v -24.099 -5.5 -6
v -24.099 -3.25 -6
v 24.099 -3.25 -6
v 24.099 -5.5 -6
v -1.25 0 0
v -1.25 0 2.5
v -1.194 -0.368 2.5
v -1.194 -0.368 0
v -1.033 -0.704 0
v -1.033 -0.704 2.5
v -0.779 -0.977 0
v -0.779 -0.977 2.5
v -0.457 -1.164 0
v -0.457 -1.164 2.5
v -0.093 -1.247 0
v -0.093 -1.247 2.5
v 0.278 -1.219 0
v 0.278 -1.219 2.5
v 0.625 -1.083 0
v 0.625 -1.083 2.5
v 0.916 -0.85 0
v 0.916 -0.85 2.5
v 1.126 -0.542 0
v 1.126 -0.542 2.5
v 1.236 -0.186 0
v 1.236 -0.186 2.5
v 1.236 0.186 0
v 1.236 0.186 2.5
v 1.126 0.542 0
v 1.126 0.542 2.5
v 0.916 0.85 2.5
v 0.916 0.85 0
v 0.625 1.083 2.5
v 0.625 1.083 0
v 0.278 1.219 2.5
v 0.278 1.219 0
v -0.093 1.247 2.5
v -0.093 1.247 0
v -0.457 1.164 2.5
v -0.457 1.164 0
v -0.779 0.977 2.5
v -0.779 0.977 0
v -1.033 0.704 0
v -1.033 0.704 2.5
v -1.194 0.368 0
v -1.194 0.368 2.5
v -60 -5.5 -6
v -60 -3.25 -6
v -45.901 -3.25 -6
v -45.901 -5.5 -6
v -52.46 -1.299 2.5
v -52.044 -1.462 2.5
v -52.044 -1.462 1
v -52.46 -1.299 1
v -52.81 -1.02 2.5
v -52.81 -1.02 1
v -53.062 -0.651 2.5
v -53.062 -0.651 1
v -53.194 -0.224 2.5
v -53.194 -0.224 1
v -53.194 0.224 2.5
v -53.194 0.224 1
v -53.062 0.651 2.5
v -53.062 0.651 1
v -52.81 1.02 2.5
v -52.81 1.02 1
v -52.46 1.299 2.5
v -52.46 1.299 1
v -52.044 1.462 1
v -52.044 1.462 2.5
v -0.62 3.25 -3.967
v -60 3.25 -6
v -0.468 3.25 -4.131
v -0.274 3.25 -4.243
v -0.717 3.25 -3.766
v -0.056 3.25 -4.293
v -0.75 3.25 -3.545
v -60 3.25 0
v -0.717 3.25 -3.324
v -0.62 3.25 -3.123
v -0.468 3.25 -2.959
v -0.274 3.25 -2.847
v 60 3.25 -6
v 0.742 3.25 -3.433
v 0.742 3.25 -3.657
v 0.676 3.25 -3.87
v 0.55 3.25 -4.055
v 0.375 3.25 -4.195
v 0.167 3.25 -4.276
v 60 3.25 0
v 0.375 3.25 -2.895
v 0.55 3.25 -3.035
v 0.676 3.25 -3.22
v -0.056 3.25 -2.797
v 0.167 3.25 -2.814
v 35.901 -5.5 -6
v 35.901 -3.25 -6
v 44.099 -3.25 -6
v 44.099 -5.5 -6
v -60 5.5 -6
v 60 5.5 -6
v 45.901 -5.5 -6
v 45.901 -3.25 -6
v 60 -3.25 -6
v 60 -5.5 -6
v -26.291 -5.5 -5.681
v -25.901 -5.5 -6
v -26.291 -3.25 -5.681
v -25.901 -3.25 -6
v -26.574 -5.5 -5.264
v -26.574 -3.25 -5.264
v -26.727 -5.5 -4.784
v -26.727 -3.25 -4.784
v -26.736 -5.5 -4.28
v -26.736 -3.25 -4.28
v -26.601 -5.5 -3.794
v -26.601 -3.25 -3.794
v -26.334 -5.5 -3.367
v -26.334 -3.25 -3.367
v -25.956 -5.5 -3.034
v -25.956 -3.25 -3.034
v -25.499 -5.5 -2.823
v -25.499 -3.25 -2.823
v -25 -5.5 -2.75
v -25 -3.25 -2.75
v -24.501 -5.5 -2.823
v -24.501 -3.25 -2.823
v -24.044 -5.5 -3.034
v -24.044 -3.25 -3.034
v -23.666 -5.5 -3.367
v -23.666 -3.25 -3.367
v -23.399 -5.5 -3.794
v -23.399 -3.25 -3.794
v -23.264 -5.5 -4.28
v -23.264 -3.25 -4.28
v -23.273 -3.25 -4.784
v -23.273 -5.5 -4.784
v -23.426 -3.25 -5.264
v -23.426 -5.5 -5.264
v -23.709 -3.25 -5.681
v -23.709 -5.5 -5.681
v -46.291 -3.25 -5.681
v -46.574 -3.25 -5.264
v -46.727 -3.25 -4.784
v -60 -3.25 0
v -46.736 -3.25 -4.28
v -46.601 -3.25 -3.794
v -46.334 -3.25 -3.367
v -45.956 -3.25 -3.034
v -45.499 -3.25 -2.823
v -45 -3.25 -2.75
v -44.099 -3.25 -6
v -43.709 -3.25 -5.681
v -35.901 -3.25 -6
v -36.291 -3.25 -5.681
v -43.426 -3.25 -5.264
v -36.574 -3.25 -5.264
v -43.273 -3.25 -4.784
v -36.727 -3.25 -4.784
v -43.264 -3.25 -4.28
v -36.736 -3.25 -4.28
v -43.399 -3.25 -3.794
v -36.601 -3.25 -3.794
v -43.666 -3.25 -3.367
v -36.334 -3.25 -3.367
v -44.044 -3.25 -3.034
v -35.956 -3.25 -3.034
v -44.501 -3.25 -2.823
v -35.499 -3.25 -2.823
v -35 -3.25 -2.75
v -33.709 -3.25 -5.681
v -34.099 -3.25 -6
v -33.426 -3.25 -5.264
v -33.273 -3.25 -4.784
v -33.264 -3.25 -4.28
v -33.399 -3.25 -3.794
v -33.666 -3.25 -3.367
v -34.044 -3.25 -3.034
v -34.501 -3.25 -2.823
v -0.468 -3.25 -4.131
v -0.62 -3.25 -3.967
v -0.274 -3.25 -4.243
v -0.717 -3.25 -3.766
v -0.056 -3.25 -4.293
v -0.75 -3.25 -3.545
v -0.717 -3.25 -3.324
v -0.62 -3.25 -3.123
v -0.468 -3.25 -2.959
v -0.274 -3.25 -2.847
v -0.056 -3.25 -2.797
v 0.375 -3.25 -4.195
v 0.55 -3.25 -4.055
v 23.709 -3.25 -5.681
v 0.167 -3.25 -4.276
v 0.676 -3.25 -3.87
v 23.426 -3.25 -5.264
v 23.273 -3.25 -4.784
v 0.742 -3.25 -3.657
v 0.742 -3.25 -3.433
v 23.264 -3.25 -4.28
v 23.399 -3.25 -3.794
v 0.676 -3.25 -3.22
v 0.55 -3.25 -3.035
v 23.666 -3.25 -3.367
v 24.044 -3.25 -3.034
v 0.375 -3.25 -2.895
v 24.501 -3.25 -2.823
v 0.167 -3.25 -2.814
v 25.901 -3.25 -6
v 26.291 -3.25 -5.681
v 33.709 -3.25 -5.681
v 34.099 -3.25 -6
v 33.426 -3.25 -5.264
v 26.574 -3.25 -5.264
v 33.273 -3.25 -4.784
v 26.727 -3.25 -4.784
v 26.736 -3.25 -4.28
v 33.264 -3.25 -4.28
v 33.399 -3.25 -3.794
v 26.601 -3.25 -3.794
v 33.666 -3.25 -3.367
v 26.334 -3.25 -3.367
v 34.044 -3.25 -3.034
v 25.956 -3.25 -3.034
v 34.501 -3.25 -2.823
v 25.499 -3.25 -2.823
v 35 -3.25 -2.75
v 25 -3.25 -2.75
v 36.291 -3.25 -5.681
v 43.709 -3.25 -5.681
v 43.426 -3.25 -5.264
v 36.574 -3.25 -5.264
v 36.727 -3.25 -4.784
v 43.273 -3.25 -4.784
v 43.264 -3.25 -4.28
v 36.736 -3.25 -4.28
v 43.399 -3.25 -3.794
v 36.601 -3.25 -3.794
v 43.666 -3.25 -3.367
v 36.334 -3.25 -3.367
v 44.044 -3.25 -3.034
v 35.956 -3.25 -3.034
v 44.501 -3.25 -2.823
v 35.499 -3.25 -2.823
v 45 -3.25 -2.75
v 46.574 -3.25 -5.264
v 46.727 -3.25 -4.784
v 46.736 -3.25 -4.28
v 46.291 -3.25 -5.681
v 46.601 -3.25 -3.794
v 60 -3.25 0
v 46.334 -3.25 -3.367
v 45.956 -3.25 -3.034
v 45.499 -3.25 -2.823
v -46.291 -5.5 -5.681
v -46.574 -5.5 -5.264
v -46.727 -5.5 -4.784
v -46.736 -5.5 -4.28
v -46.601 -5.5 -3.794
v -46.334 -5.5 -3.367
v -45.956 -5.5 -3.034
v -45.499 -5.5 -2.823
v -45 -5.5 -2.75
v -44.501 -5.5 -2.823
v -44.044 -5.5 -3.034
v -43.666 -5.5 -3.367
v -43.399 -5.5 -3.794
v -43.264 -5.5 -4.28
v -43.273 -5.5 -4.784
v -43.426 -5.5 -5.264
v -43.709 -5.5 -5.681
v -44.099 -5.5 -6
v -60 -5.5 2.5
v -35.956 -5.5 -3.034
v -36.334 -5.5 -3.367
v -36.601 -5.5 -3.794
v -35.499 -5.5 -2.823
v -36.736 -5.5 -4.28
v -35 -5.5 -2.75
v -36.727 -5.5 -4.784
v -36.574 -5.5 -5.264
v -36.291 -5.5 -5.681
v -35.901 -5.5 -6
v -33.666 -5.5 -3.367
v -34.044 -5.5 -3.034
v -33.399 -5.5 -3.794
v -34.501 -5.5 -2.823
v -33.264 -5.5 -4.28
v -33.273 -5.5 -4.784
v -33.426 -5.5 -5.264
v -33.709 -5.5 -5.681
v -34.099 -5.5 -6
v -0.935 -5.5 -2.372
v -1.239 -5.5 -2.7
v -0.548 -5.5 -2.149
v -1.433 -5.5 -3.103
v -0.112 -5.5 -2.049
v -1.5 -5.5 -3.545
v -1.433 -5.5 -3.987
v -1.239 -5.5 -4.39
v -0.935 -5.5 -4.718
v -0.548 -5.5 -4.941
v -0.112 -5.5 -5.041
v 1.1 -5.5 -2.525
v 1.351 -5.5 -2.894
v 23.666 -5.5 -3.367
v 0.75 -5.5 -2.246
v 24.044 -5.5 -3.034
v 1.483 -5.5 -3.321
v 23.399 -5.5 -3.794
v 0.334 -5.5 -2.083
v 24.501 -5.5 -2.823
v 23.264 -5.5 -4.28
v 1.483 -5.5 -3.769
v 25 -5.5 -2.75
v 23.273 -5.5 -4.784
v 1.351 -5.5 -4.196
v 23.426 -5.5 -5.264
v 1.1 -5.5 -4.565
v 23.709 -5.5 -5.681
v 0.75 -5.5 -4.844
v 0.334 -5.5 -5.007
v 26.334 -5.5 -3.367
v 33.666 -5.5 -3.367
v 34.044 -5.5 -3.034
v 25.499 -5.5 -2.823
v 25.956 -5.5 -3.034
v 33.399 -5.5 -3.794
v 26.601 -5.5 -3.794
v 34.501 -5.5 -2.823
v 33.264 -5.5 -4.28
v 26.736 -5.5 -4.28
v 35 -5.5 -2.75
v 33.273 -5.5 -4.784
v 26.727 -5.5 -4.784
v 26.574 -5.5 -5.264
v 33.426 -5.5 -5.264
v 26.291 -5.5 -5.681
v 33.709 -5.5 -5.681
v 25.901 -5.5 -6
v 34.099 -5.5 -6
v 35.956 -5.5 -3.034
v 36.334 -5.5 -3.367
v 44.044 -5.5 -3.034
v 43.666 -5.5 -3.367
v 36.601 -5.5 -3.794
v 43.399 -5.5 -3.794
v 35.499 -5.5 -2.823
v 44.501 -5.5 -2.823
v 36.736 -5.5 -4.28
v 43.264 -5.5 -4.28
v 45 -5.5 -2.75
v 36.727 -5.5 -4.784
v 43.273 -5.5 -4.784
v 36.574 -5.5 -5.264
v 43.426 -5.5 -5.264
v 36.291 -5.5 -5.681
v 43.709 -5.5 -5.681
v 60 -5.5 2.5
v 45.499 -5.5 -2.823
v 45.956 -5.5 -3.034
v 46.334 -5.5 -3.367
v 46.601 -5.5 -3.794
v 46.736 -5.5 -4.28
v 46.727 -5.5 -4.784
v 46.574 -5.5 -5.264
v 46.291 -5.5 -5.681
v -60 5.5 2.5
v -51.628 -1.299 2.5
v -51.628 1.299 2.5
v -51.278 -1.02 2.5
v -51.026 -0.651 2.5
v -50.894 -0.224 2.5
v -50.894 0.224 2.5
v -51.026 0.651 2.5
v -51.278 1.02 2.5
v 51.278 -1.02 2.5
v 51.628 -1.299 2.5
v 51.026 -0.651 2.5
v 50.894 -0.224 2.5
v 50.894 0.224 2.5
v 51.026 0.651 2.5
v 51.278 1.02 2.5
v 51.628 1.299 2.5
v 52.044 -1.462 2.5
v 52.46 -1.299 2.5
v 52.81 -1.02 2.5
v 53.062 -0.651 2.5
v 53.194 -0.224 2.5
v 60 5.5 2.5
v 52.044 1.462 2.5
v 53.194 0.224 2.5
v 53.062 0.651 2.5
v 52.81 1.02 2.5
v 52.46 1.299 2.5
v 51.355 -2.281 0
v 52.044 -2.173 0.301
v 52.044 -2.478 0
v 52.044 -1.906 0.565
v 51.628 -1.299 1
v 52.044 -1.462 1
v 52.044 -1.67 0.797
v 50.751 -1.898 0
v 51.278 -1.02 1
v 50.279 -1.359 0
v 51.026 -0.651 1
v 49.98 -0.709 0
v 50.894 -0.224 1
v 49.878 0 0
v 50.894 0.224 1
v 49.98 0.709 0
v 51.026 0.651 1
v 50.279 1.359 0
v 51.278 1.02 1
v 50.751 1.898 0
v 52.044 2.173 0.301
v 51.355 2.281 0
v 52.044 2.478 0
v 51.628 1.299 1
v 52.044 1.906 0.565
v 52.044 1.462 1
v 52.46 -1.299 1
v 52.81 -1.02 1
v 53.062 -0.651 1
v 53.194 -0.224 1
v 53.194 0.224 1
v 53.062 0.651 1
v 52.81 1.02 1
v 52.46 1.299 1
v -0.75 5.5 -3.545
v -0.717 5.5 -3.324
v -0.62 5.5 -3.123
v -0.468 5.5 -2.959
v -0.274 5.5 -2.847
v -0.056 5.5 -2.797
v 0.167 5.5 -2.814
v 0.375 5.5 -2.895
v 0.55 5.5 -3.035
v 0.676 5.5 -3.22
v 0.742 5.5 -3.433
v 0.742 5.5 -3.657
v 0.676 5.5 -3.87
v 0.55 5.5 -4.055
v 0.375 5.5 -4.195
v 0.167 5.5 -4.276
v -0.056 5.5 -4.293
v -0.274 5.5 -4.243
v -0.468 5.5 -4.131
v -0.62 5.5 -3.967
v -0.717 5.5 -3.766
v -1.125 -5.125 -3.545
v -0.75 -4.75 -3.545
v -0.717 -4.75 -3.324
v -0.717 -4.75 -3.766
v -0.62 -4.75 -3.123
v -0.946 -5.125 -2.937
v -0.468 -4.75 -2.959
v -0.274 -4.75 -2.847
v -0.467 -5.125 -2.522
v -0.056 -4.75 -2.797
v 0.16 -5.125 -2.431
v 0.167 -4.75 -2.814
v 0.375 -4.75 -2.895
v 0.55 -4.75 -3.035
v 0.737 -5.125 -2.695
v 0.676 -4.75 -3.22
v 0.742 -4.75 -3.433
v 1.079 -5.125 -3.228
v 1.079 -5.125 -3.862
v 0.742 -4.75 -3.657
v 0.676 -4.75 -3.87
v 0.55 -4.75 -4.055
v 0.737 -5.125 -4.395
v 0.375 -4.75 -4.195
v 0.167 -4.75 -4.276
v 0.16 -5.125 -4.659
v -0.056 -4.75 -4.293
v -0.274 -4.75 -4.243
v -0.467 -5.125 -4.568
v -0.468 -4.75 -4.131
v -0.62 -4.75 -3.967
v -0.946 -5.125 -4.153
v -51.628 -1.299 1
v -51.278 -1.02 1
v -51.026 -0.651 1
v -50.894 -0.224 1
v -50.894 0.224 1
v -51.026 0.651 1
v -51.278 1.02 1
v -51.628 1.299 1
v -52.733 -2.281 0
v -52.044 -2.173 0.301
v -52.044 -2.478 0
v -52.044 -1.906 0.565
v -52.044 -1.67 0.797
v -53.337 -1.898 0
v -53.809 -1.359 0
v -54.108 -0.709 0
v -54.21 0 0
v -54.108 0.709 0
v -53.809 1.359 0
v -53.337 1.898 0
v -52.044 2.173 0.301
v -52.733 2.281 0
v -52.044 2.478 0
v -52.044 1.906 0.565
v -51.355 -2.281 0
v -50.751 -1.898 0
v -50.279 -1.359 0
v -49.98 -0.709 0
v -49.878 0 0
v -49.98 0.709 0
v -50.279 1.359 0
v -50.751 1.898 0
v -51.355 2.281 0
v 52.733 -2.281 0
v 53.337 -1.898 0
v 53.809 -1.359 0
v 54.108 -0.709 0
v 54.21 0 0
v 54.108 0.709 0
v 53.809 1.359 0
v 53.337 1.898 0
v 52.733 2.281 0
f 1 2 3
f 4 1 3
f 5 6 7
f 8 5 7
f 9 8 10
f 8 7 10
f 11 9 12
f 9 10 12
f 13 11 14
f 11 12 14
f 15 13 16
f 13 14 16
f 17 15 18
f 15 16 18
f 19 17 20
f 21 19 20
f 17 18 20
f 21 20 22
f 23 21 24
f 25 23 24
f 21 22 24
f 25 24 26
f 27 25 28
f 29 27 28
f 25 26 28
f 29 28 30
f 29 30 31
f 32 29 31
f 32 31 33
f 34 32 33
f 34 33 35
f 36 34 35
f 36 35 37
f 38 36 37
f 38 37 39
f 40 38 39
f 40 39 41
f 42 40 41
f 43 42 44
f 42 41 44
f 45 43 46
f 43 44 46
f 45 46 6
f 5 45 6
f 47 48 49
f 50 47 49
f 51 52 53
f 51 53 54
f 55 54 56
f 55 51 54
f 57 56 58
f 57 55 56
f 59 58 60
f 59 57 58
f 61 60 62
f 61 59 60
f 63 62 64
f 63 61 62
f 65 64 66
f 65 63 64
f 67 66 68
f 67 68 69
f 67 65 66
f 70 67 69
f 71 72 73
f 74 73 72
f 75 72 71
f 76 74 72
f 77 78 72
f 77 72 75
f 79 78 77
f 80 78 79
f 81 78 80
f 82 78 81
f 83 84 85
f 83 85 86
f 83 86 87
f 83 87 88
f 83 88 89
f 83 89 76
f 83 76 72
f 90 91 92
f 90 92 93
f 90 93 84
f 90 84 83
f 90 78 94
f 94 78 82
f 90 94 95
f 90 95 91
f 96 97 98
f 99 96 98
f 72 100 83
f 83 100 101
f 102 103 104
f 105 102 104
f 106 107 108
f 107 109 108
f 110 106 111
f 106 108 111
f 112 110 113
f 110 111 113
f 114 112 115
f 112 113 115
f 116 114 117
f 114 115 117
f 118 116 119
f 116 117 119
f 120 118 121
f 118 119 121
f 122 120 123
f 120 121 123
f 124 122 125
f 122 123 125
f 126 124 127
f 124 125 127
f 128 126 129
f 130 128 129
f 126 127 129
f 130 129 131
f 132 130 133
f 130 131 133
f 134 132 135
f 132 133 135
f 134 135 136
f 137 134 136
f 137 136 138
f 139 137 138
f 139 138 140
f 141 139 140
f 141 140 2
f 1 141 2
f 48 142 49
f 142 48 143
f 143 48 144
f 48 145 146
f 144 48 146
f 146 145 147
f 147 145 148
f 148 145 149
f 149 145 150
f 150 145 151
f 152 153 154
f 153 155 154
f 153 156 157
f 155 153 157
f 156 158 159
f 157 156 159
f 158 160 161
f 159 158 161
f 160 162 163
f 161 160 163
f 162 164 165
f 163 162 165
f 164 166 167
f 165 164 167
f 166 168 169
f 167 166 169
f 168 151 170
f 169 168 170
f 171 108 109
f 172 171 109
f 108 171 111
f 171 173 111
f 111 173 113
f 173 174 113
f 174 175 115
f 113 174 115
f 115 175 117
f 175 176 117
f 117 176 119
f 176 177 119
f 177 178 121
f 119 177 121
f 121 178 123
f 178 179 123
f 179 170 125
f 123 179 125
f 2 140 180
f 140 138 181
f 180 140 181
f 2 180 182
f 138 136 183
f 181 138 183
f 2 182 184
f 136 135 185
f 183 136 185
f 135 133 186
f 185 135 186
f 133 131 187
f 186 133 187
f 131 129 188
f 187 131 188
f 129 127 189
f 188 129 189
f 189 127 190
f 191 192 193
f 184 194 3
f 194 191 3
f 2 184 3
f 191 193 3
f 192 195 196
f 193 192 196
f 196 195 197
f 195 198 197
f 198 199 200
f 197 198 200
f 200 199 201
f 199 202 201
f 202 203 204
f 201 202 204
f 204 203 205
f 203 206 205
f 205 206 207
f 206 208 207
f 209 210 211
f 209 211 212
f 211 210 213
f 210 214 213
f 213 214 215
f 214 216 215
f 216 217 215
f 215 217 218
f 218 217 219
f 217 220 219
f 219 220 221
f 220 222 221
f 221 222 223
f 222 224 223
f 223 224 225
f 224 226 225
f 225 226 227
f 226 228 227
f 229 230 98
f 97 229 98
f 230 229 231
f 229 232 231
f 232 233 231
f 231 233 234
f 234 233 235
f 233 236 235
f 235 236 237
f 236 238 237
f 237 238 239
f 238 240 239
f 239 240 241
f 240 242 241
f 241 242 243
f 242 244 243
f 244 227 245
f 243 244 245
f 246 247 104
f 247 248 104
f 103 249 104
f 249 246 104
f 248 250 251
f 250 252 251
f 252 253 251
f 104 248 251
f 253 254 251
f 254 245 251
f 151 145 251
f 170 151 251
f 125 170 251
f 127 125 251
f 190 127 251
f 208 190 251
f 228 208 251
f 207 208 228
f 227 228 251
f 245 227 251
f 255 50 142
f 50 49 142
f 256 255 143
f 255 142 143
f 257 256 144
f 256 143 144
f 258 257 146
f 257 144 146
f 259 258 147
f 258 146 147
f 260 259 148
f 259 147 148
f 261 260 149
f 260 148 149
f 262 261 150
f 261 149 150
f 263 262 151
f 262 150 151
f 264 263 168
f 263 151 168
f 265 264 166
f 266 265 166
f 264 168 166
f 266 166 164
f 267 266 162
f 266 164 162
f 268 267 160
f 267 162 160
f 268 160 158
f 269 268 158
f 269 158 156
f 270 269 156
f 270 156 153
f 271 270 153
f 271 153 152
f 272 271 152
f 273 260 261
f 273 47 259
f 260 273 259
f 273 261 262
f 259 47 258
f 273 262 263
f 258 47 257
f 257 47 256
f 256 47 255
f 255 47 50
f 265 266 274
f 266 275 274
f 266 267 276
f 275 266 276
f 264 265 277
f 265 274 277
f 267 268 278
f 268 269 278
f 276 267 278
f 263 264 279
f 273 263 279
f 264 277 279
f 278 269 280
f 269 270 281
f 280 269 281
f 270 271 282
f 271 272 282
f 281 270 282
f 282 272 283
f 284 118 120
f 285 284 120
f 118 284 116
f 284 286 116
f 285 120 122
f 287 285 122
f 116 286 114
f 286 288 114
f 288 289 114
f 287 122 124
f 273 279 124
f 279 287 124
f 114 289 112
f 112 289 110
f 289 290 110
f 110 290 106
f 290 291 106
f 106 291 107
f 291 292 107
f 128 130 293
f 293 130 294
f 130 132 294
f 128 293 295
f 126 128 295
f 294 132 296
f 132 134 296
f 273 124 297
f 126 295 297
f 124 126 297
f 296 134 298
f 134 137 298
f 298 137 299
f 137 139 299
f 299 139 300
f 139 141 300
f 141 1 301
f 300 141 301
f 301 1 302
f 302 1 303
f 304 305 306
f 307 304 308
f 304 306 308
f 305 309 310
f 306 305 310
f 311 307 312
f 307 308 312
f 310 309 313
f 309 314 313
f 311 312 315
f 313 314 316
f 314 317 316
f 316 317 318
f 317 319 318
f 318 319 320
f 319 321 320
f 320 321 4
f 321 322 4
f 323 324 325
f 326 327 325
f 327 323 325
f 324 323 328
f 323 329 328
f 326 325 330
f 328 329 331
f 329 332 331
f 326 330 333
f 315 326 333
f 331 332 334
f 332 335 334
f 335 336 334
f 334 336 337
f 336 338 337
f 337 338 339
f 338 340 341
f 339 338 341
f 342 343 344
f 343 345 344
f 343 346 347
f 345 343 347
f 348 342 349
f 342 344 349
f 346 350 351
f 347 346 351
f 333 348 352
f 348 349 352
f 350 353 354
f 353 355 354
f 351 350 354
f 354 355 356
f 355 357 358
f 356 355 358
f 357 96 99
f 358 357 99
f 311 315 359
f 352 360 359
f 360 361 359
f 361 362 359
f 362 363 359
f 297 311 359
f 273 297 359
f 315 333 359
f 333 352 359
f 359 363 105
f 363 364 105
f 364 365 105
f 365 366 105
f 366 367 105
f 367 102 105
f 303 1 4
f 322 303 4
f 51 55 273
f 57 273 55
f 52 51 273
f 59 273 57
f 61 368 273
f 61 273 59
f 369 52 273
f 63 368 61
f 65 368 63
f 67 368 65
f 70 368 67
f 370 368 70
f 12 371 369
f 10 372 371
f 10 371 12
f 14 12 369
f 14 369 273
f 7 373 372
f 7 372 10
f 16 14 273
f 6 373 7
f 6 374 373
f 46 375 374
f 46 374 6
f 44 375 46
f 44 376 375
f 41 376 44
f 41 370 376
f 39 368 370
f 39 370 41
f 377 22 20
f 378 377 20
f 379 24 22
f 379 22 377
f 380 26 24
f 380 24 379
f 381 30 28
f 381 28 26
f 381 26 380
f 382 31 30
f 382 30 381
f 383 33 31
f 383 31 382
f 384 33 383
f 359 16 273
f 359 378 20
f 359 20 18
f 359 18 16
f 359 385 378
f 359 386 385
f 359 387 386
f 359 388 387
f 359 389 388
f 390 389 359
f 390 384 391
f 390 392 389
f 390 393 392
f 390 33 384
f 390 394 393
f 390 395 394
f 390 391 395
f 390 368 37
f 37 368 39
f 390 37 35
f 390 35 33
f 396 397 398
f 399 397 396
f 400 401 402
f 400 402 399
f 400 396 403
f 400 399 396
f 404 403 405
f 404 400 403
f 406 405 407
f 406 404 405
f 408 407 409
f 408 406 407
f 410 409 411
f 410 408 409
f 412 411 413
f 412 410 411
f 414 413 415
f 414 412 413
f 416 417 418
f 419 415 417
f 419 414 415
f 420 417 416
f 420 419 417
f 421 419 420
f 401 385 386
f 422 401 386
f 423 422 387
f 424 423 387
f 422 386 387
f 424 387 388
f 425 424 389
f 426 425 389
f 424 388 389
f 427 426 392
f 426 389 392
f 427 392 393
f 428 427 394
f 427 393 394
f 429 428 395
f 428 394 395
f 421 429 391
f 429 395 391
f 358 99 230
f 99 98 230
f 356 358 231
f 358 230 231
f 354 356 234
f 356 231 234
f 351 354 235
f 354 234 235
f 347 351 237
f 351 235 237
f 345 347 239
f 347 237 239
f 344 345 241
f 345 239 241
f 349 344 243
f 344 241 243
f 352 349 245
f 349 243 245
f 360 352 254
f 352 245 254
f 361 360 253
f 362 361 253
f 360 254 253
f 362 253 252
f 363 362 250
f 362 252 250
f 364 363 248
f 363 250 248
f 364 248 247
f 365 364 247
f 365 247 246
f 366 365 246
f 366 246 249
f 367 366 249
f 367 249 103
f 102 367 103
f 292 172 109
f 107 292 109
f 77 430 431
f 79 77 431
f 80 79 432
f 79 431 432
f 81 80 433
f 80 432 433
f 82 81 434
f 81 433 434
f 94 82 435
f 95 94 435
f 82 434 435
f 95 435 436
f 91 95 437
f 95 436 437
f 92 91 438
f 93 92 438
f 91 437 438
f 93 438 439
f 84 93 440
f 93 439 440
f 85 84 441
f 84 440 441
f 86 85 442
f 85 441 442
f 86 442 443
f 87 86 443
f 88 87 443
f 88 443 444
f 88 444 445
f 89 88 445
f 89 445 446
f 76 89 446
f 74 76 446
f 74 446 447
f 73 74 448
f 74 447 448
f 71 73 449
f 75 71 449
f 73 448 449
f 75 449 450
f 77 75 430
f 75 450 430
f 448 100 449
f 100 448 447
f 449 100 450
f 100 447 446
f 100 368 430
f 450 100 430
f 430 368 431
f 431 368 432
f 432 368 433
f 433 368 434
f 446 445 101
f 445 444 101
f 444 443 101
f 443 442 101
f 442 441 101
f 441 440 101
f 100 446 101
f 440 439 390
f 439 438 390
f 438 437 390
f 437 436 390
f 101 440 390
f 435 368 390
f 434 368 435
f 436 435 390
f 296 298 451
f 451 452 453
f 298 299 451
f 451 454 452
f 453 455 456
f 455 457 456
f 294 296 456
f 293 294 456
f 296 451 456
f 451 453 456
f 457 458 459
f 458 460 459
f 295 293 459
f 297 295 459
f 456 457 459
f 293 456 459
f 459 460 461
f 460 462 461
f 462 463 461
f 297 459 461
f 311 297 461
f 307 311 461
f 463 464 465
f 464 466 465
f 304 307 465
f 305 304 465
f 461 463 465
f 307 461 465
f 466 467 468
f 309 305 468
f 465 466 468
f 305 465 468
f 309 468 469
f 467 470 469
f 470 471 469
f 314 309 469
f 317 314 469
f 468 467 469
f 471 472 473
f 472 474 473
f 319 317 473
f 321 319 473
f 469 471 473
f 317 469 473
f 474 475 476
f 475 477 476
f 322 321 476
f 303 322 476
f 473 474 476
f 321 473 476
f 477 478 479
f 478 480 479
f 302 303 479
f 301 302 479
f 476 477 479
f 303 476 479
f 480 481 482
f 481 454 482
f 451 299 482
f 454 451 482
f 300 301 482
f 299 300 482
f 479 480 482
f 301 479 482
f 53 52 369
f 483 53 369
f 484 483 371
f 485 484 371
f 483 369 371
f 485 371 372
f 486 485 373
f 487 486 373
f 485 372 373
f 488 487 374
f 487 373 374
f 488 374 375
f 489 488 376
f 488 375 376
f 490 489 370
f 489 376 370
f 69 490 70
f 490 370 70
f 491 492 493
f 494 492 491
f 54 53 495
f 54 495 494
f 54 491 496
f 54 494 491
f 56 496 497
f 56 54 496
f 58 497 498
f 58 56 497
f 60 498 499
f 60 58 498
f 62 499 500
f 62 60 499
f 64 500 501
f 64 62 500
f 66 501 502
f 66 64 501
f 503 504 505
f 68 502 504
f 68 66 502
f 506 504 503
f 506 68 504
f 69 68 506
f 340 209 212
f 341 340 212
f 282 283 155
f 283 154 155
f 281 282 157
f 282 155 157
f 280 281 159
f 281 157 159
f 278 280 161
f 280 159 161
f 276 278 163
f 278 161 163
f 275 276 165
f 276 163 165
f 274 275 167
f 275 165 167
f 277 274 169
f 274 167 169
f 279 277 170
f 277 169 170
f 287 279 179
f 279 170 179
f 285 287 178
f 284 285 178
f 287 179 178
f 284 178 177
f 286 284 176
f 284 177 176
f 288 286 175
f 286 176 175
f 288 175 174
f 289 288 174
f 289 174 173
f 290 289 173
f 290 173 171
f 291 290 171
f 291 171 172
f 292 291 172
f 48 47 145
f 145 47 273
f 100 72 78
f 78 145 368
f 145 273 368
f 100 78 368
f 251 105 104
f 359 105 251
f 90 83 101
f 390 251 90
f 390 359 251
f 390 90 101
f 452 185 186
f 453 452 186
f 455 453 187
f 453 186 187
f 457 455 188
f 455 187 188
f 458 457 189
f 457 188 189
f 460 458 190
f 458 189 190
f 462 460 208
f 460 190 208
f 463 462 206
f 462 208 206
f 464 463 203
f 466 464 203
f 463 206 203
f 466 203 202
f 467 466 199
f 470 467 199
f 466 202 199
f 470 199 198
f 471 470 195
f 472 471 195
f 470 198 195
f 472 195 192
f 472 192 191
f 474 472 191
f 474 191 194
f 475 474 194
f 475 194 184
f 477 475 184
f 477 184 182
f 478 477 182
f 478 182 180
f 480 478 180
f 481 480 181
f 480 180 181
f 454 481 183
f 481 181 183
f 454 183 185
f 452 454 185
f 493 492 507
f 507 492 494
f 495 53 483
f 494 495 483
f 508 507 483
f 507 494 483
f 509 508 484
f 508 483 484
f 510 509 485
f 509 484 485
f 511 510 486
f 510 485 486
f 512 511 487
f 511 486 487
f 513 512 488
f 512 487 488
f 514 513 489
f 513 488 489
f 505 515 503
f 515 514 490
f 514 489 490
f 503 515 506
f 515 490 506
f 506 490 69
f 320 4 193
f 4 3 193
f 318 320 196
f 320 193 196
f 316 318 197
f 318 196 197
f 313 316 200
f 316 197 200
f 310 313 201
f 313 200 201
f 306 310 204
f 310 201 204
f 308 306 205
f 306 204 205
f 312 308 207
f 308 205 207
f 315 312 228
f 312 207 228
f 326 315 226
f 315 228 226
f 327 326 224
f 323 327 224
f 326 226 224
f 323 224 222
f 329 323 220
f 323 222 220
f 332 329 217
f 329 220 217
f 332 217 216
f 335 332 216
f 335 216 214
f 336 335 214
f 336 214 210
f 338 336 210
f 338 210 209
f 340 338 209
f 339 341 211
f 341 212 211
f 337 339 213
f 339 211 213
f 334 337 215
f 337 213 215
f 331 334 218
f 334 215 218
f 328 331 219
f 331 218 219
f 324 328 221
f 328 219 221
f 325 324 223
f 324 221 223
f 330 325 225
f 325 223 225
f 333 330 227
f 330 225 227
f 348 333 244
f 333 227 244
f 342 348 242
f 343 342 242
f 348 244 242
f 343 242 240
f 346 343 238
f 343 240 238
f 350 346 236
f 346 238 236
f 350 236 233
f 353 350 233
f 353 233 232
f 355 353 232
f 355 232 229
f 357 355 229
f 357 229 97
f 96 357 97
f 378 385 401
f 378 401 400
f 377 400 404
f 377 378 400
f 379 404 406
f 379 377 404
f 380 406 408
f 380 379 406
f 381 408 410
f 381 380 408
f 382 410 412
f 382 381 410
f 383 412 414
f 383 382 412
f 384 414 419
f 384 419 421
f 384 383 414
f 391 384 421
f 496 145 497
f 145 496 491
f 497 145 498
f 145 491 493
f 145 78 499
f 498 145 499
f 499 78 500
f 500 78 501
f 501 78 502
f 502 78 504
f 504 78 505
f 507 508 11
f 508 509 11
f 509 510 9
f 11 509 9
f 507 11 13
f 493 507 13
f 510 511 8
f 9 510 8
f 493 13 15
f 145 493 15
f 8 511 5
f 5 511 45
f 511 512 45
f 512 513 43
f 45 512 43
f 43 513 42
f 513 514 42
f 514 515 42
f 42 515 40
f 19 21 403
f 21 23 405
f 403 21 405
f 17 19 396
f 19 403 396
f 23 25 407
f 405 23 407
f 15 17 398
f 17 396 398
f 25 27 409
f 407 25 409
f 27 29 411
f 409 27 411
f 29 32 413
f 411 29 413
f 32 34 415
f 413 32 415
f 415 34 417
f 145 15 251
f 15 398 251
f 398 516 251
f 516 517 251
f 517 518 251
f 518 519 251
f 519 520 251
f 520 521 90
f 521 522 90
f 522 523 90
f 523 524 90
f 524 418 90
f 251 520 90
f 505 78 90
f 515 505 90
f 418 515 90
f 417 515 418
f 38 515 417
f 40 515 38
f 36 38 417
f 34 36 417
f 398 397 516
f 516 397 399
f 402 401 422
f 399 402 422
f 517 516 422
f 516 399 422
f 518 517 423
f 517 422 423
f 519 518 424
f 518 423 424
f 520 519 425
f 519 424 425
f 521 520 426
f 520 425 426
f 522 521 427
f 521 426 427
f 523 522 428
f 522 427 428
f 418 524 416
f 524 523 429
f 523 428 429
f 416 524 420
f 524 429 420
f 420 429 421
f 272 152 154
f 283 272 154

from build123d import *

# Parameters (mm, degrees)
F0_W            = 120
F0_H            = 2.25
F0_H_2          = 6.5
F1_DEPTH        = 2.5
F2_DEPTH        = 6
F6_D            = 3
F6_CSINK_D      = 5
F6_CSINK_ANGLE  = 90
F7_D            = 2.5
F8_D            = 3.5
F8_DEPTH        = 3
F8_TIP          = 1.0515060833
F10_D           = 1.5
F10_CSINK_D     = 3
F10_CSINK_ANGLE = 90


# Not quite as in the source:
# - a feature names something its author has since deleted; it is built from what else it names


with BuildPart() as f1:
    # F0 (on Top) → F1 (new body)
    with BuildSketch(Plane.XY):
        with Locations((0, 4.375)):
            Rectangle(F0_W, F0_H)
        Rectangle(F0_W, F0_H_2)
        with Locations((0, -4.375)):
            Rectangle(F0_W, F0_H)
    extrude(amount=F1_DEPTH)

    # F0 (on Top) → F2 (join)
    with BuildSketch(Plane.XY):
        with Locations((0, 4.375)):
            Rectangle(F0_W, F0_H)
        with Locations((0, -4.375)):
            Rectangle(F0_W, F0_H)
    extrude(amount=-F2_DEPTH)

    # F6 (through all)
    with Locations(Plane(origin=(0, 0, 0), x_dir=(1, 0, 0), z_dir=(0, 0, -1))):
        with Locations((-52.377641201, 0), (51.710255444, 0)):
            CounterSinkHole(F6_D / 2, F6_CSINK_D / 2, counter_sink_angle=F6_CSINK_ANGLE)

    # F7 (through all)
    with Locations(Plane(origin=(0, 0, 0), x_dir=(1, 0, 0), z_dir=(0, 0, -1))):
        with Locations((0, 0)):
            Hole(F7_D / 2)

    # F8
    with Locations(Plane.XZ.offset(5.5)):
        with Locations((-45, -4.5), (-35, -4.5), (-25, -4.5), (25, -4.5), (35, -4.5), (45, -4.5)):
            Hole(F8_D / 2, depth=F8_DEPTH)
            with Locations((0, 0, -(F8_DEPTH + F8_TIP / 2))):  # 118° drill point
                Cone(0, F8_D / 2, F8_TIP, mode=Mode.SUBTRACT)

    # F10 (through all)
    with Locations(Plane.XZ.offset(5.5)):
        with Locations((0, -3.5449948628)):
            CounterSinkHole(F10_D / 2, F10_CSINK_D / 2, counter_sink_angle=F10_CSINK_ANGLE)

    # F11: F1 across plane


with BuildPart() as f1_1:
    add(f1.part)
    add(f1.part.mirror(Plane.YZ))


solid = f1_1.part
